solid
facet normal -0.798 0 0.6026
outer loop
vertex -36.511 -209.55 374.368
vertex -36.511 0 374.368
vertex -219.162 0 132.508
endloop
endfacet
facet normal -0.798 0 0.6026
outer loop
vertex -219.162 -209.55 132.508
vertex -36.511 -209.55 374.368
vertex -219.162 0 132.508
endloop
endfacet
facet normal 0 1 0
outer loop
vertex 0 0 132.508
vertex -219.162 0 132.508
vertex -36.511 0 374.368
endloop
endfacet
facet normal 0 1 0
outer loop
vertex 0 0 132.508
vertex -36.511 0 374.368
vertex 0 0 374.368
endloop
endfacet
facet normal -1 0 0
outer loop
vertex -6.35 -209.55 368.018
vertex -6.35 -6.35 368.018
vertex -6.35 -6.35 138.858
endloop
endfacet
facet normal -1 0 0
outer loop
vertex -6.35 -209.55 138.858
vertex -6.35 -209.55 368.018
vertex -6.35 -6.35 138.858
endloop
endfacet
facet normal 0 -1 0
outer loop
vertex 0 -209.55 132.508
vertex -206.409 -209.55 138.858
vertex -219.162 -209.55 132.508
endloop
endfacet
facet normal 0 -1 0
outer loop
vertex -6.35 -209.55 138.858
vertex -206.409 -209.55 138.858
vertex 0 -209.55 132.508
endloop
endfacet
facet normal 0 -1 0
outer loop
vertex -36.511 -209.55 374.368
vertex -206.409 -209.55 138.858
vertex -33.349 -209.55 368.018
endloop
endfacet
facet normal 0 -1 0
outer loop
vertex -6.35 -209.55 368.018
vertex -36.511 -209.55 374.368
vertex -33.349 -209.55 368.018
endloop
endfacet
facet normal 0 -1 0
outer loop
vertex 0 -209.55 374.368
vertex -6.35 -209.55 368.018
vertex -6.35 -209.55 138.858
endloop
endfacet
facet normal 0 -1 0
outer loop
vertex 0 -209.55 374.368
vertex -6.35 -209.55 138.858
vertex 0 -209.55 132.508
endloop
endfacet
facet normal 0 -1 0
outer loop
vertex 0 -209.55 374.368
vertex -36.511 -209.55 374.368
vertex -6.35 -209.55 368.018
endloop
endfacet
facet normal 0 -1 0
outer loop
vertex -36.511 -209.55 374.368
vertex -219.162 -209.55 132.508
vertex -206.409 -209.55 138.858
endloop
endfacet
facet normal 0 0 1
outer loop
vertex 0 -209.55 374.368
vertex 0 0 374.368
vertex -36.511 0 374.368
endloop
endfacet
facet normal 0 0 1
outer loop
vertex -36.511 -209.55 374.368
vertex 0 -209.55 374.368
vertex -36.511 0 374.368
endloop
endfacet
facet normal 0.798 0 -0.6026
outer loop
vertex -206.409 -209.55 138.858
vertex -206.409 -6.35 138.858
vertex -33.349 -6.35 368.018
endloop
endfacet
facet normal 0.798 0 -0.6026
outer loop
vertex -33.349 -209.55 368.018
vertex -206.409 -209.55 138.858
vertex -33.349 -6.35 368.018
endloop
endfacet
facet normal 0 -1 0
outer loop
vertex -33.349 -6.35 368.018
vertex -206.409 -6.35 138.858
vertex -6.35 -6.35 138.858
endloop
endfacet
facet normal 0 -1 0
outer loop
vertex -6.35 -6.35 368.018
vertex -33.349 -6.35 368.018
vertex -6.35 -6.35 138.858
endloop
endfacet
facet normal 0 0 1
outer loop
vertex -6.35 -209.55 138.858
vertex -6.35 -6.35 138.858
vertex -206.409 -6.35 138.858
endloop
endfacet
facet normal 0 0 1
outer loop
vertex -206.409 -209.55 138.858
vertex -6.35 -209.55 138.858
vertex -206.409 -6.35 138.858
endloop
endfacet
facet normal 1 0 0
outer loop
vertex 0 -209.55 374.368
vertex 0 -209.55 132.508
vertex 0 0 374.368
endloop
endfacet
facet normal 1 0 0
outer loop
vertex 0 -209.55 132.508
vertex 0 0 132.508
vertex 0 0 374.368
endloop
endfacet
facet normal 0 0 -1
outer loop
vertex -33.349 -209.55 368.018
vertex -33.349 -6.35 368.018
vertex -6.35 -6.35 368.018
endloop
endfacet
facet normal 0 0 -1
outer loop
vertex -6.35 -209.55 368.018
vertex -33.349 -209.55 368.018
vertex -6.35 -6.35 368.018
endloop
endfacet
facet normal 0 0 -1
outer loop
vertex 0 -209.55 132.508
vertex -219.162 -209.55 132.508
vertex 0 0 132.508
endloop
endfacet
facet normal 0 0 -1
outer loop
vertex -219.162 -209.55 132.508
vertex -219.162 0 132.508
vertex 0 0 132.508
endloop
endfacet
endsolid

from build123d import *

# Parameters (mm, degrees)
F2_DEPTH = 6.35
F4_DEPTH = 203.2


with BuildPart() as f2:
    # F1 (on Front) → F2 (new body)
    with BuildSketch(Plane.XZ):
        Polygon((-36.510564, 374.367909), (-219.162132, 132.508471), (0, 132.508471), (0, 374.367909), align=None)
    extrude(amount=F2_DEPTH)

    # F3 (on face) → F4 (join)
    with BuildSketch(Plane.XZ.offset(6.35)):
        Polygon((-36.510564, 374.367909), (-219.162132, 132.508471), (0, 132.508471), (0, 374.367909), align=None)
        Polygon((-206.409285, 138.858471), (-33.348721, 368.017909), (-6.35, 368.017909), (-6.35, 138.858471), align=None, mode=Mode.SUBTRACT)
    extrude(amount=F4_DEPTH)


solid = f2.part
